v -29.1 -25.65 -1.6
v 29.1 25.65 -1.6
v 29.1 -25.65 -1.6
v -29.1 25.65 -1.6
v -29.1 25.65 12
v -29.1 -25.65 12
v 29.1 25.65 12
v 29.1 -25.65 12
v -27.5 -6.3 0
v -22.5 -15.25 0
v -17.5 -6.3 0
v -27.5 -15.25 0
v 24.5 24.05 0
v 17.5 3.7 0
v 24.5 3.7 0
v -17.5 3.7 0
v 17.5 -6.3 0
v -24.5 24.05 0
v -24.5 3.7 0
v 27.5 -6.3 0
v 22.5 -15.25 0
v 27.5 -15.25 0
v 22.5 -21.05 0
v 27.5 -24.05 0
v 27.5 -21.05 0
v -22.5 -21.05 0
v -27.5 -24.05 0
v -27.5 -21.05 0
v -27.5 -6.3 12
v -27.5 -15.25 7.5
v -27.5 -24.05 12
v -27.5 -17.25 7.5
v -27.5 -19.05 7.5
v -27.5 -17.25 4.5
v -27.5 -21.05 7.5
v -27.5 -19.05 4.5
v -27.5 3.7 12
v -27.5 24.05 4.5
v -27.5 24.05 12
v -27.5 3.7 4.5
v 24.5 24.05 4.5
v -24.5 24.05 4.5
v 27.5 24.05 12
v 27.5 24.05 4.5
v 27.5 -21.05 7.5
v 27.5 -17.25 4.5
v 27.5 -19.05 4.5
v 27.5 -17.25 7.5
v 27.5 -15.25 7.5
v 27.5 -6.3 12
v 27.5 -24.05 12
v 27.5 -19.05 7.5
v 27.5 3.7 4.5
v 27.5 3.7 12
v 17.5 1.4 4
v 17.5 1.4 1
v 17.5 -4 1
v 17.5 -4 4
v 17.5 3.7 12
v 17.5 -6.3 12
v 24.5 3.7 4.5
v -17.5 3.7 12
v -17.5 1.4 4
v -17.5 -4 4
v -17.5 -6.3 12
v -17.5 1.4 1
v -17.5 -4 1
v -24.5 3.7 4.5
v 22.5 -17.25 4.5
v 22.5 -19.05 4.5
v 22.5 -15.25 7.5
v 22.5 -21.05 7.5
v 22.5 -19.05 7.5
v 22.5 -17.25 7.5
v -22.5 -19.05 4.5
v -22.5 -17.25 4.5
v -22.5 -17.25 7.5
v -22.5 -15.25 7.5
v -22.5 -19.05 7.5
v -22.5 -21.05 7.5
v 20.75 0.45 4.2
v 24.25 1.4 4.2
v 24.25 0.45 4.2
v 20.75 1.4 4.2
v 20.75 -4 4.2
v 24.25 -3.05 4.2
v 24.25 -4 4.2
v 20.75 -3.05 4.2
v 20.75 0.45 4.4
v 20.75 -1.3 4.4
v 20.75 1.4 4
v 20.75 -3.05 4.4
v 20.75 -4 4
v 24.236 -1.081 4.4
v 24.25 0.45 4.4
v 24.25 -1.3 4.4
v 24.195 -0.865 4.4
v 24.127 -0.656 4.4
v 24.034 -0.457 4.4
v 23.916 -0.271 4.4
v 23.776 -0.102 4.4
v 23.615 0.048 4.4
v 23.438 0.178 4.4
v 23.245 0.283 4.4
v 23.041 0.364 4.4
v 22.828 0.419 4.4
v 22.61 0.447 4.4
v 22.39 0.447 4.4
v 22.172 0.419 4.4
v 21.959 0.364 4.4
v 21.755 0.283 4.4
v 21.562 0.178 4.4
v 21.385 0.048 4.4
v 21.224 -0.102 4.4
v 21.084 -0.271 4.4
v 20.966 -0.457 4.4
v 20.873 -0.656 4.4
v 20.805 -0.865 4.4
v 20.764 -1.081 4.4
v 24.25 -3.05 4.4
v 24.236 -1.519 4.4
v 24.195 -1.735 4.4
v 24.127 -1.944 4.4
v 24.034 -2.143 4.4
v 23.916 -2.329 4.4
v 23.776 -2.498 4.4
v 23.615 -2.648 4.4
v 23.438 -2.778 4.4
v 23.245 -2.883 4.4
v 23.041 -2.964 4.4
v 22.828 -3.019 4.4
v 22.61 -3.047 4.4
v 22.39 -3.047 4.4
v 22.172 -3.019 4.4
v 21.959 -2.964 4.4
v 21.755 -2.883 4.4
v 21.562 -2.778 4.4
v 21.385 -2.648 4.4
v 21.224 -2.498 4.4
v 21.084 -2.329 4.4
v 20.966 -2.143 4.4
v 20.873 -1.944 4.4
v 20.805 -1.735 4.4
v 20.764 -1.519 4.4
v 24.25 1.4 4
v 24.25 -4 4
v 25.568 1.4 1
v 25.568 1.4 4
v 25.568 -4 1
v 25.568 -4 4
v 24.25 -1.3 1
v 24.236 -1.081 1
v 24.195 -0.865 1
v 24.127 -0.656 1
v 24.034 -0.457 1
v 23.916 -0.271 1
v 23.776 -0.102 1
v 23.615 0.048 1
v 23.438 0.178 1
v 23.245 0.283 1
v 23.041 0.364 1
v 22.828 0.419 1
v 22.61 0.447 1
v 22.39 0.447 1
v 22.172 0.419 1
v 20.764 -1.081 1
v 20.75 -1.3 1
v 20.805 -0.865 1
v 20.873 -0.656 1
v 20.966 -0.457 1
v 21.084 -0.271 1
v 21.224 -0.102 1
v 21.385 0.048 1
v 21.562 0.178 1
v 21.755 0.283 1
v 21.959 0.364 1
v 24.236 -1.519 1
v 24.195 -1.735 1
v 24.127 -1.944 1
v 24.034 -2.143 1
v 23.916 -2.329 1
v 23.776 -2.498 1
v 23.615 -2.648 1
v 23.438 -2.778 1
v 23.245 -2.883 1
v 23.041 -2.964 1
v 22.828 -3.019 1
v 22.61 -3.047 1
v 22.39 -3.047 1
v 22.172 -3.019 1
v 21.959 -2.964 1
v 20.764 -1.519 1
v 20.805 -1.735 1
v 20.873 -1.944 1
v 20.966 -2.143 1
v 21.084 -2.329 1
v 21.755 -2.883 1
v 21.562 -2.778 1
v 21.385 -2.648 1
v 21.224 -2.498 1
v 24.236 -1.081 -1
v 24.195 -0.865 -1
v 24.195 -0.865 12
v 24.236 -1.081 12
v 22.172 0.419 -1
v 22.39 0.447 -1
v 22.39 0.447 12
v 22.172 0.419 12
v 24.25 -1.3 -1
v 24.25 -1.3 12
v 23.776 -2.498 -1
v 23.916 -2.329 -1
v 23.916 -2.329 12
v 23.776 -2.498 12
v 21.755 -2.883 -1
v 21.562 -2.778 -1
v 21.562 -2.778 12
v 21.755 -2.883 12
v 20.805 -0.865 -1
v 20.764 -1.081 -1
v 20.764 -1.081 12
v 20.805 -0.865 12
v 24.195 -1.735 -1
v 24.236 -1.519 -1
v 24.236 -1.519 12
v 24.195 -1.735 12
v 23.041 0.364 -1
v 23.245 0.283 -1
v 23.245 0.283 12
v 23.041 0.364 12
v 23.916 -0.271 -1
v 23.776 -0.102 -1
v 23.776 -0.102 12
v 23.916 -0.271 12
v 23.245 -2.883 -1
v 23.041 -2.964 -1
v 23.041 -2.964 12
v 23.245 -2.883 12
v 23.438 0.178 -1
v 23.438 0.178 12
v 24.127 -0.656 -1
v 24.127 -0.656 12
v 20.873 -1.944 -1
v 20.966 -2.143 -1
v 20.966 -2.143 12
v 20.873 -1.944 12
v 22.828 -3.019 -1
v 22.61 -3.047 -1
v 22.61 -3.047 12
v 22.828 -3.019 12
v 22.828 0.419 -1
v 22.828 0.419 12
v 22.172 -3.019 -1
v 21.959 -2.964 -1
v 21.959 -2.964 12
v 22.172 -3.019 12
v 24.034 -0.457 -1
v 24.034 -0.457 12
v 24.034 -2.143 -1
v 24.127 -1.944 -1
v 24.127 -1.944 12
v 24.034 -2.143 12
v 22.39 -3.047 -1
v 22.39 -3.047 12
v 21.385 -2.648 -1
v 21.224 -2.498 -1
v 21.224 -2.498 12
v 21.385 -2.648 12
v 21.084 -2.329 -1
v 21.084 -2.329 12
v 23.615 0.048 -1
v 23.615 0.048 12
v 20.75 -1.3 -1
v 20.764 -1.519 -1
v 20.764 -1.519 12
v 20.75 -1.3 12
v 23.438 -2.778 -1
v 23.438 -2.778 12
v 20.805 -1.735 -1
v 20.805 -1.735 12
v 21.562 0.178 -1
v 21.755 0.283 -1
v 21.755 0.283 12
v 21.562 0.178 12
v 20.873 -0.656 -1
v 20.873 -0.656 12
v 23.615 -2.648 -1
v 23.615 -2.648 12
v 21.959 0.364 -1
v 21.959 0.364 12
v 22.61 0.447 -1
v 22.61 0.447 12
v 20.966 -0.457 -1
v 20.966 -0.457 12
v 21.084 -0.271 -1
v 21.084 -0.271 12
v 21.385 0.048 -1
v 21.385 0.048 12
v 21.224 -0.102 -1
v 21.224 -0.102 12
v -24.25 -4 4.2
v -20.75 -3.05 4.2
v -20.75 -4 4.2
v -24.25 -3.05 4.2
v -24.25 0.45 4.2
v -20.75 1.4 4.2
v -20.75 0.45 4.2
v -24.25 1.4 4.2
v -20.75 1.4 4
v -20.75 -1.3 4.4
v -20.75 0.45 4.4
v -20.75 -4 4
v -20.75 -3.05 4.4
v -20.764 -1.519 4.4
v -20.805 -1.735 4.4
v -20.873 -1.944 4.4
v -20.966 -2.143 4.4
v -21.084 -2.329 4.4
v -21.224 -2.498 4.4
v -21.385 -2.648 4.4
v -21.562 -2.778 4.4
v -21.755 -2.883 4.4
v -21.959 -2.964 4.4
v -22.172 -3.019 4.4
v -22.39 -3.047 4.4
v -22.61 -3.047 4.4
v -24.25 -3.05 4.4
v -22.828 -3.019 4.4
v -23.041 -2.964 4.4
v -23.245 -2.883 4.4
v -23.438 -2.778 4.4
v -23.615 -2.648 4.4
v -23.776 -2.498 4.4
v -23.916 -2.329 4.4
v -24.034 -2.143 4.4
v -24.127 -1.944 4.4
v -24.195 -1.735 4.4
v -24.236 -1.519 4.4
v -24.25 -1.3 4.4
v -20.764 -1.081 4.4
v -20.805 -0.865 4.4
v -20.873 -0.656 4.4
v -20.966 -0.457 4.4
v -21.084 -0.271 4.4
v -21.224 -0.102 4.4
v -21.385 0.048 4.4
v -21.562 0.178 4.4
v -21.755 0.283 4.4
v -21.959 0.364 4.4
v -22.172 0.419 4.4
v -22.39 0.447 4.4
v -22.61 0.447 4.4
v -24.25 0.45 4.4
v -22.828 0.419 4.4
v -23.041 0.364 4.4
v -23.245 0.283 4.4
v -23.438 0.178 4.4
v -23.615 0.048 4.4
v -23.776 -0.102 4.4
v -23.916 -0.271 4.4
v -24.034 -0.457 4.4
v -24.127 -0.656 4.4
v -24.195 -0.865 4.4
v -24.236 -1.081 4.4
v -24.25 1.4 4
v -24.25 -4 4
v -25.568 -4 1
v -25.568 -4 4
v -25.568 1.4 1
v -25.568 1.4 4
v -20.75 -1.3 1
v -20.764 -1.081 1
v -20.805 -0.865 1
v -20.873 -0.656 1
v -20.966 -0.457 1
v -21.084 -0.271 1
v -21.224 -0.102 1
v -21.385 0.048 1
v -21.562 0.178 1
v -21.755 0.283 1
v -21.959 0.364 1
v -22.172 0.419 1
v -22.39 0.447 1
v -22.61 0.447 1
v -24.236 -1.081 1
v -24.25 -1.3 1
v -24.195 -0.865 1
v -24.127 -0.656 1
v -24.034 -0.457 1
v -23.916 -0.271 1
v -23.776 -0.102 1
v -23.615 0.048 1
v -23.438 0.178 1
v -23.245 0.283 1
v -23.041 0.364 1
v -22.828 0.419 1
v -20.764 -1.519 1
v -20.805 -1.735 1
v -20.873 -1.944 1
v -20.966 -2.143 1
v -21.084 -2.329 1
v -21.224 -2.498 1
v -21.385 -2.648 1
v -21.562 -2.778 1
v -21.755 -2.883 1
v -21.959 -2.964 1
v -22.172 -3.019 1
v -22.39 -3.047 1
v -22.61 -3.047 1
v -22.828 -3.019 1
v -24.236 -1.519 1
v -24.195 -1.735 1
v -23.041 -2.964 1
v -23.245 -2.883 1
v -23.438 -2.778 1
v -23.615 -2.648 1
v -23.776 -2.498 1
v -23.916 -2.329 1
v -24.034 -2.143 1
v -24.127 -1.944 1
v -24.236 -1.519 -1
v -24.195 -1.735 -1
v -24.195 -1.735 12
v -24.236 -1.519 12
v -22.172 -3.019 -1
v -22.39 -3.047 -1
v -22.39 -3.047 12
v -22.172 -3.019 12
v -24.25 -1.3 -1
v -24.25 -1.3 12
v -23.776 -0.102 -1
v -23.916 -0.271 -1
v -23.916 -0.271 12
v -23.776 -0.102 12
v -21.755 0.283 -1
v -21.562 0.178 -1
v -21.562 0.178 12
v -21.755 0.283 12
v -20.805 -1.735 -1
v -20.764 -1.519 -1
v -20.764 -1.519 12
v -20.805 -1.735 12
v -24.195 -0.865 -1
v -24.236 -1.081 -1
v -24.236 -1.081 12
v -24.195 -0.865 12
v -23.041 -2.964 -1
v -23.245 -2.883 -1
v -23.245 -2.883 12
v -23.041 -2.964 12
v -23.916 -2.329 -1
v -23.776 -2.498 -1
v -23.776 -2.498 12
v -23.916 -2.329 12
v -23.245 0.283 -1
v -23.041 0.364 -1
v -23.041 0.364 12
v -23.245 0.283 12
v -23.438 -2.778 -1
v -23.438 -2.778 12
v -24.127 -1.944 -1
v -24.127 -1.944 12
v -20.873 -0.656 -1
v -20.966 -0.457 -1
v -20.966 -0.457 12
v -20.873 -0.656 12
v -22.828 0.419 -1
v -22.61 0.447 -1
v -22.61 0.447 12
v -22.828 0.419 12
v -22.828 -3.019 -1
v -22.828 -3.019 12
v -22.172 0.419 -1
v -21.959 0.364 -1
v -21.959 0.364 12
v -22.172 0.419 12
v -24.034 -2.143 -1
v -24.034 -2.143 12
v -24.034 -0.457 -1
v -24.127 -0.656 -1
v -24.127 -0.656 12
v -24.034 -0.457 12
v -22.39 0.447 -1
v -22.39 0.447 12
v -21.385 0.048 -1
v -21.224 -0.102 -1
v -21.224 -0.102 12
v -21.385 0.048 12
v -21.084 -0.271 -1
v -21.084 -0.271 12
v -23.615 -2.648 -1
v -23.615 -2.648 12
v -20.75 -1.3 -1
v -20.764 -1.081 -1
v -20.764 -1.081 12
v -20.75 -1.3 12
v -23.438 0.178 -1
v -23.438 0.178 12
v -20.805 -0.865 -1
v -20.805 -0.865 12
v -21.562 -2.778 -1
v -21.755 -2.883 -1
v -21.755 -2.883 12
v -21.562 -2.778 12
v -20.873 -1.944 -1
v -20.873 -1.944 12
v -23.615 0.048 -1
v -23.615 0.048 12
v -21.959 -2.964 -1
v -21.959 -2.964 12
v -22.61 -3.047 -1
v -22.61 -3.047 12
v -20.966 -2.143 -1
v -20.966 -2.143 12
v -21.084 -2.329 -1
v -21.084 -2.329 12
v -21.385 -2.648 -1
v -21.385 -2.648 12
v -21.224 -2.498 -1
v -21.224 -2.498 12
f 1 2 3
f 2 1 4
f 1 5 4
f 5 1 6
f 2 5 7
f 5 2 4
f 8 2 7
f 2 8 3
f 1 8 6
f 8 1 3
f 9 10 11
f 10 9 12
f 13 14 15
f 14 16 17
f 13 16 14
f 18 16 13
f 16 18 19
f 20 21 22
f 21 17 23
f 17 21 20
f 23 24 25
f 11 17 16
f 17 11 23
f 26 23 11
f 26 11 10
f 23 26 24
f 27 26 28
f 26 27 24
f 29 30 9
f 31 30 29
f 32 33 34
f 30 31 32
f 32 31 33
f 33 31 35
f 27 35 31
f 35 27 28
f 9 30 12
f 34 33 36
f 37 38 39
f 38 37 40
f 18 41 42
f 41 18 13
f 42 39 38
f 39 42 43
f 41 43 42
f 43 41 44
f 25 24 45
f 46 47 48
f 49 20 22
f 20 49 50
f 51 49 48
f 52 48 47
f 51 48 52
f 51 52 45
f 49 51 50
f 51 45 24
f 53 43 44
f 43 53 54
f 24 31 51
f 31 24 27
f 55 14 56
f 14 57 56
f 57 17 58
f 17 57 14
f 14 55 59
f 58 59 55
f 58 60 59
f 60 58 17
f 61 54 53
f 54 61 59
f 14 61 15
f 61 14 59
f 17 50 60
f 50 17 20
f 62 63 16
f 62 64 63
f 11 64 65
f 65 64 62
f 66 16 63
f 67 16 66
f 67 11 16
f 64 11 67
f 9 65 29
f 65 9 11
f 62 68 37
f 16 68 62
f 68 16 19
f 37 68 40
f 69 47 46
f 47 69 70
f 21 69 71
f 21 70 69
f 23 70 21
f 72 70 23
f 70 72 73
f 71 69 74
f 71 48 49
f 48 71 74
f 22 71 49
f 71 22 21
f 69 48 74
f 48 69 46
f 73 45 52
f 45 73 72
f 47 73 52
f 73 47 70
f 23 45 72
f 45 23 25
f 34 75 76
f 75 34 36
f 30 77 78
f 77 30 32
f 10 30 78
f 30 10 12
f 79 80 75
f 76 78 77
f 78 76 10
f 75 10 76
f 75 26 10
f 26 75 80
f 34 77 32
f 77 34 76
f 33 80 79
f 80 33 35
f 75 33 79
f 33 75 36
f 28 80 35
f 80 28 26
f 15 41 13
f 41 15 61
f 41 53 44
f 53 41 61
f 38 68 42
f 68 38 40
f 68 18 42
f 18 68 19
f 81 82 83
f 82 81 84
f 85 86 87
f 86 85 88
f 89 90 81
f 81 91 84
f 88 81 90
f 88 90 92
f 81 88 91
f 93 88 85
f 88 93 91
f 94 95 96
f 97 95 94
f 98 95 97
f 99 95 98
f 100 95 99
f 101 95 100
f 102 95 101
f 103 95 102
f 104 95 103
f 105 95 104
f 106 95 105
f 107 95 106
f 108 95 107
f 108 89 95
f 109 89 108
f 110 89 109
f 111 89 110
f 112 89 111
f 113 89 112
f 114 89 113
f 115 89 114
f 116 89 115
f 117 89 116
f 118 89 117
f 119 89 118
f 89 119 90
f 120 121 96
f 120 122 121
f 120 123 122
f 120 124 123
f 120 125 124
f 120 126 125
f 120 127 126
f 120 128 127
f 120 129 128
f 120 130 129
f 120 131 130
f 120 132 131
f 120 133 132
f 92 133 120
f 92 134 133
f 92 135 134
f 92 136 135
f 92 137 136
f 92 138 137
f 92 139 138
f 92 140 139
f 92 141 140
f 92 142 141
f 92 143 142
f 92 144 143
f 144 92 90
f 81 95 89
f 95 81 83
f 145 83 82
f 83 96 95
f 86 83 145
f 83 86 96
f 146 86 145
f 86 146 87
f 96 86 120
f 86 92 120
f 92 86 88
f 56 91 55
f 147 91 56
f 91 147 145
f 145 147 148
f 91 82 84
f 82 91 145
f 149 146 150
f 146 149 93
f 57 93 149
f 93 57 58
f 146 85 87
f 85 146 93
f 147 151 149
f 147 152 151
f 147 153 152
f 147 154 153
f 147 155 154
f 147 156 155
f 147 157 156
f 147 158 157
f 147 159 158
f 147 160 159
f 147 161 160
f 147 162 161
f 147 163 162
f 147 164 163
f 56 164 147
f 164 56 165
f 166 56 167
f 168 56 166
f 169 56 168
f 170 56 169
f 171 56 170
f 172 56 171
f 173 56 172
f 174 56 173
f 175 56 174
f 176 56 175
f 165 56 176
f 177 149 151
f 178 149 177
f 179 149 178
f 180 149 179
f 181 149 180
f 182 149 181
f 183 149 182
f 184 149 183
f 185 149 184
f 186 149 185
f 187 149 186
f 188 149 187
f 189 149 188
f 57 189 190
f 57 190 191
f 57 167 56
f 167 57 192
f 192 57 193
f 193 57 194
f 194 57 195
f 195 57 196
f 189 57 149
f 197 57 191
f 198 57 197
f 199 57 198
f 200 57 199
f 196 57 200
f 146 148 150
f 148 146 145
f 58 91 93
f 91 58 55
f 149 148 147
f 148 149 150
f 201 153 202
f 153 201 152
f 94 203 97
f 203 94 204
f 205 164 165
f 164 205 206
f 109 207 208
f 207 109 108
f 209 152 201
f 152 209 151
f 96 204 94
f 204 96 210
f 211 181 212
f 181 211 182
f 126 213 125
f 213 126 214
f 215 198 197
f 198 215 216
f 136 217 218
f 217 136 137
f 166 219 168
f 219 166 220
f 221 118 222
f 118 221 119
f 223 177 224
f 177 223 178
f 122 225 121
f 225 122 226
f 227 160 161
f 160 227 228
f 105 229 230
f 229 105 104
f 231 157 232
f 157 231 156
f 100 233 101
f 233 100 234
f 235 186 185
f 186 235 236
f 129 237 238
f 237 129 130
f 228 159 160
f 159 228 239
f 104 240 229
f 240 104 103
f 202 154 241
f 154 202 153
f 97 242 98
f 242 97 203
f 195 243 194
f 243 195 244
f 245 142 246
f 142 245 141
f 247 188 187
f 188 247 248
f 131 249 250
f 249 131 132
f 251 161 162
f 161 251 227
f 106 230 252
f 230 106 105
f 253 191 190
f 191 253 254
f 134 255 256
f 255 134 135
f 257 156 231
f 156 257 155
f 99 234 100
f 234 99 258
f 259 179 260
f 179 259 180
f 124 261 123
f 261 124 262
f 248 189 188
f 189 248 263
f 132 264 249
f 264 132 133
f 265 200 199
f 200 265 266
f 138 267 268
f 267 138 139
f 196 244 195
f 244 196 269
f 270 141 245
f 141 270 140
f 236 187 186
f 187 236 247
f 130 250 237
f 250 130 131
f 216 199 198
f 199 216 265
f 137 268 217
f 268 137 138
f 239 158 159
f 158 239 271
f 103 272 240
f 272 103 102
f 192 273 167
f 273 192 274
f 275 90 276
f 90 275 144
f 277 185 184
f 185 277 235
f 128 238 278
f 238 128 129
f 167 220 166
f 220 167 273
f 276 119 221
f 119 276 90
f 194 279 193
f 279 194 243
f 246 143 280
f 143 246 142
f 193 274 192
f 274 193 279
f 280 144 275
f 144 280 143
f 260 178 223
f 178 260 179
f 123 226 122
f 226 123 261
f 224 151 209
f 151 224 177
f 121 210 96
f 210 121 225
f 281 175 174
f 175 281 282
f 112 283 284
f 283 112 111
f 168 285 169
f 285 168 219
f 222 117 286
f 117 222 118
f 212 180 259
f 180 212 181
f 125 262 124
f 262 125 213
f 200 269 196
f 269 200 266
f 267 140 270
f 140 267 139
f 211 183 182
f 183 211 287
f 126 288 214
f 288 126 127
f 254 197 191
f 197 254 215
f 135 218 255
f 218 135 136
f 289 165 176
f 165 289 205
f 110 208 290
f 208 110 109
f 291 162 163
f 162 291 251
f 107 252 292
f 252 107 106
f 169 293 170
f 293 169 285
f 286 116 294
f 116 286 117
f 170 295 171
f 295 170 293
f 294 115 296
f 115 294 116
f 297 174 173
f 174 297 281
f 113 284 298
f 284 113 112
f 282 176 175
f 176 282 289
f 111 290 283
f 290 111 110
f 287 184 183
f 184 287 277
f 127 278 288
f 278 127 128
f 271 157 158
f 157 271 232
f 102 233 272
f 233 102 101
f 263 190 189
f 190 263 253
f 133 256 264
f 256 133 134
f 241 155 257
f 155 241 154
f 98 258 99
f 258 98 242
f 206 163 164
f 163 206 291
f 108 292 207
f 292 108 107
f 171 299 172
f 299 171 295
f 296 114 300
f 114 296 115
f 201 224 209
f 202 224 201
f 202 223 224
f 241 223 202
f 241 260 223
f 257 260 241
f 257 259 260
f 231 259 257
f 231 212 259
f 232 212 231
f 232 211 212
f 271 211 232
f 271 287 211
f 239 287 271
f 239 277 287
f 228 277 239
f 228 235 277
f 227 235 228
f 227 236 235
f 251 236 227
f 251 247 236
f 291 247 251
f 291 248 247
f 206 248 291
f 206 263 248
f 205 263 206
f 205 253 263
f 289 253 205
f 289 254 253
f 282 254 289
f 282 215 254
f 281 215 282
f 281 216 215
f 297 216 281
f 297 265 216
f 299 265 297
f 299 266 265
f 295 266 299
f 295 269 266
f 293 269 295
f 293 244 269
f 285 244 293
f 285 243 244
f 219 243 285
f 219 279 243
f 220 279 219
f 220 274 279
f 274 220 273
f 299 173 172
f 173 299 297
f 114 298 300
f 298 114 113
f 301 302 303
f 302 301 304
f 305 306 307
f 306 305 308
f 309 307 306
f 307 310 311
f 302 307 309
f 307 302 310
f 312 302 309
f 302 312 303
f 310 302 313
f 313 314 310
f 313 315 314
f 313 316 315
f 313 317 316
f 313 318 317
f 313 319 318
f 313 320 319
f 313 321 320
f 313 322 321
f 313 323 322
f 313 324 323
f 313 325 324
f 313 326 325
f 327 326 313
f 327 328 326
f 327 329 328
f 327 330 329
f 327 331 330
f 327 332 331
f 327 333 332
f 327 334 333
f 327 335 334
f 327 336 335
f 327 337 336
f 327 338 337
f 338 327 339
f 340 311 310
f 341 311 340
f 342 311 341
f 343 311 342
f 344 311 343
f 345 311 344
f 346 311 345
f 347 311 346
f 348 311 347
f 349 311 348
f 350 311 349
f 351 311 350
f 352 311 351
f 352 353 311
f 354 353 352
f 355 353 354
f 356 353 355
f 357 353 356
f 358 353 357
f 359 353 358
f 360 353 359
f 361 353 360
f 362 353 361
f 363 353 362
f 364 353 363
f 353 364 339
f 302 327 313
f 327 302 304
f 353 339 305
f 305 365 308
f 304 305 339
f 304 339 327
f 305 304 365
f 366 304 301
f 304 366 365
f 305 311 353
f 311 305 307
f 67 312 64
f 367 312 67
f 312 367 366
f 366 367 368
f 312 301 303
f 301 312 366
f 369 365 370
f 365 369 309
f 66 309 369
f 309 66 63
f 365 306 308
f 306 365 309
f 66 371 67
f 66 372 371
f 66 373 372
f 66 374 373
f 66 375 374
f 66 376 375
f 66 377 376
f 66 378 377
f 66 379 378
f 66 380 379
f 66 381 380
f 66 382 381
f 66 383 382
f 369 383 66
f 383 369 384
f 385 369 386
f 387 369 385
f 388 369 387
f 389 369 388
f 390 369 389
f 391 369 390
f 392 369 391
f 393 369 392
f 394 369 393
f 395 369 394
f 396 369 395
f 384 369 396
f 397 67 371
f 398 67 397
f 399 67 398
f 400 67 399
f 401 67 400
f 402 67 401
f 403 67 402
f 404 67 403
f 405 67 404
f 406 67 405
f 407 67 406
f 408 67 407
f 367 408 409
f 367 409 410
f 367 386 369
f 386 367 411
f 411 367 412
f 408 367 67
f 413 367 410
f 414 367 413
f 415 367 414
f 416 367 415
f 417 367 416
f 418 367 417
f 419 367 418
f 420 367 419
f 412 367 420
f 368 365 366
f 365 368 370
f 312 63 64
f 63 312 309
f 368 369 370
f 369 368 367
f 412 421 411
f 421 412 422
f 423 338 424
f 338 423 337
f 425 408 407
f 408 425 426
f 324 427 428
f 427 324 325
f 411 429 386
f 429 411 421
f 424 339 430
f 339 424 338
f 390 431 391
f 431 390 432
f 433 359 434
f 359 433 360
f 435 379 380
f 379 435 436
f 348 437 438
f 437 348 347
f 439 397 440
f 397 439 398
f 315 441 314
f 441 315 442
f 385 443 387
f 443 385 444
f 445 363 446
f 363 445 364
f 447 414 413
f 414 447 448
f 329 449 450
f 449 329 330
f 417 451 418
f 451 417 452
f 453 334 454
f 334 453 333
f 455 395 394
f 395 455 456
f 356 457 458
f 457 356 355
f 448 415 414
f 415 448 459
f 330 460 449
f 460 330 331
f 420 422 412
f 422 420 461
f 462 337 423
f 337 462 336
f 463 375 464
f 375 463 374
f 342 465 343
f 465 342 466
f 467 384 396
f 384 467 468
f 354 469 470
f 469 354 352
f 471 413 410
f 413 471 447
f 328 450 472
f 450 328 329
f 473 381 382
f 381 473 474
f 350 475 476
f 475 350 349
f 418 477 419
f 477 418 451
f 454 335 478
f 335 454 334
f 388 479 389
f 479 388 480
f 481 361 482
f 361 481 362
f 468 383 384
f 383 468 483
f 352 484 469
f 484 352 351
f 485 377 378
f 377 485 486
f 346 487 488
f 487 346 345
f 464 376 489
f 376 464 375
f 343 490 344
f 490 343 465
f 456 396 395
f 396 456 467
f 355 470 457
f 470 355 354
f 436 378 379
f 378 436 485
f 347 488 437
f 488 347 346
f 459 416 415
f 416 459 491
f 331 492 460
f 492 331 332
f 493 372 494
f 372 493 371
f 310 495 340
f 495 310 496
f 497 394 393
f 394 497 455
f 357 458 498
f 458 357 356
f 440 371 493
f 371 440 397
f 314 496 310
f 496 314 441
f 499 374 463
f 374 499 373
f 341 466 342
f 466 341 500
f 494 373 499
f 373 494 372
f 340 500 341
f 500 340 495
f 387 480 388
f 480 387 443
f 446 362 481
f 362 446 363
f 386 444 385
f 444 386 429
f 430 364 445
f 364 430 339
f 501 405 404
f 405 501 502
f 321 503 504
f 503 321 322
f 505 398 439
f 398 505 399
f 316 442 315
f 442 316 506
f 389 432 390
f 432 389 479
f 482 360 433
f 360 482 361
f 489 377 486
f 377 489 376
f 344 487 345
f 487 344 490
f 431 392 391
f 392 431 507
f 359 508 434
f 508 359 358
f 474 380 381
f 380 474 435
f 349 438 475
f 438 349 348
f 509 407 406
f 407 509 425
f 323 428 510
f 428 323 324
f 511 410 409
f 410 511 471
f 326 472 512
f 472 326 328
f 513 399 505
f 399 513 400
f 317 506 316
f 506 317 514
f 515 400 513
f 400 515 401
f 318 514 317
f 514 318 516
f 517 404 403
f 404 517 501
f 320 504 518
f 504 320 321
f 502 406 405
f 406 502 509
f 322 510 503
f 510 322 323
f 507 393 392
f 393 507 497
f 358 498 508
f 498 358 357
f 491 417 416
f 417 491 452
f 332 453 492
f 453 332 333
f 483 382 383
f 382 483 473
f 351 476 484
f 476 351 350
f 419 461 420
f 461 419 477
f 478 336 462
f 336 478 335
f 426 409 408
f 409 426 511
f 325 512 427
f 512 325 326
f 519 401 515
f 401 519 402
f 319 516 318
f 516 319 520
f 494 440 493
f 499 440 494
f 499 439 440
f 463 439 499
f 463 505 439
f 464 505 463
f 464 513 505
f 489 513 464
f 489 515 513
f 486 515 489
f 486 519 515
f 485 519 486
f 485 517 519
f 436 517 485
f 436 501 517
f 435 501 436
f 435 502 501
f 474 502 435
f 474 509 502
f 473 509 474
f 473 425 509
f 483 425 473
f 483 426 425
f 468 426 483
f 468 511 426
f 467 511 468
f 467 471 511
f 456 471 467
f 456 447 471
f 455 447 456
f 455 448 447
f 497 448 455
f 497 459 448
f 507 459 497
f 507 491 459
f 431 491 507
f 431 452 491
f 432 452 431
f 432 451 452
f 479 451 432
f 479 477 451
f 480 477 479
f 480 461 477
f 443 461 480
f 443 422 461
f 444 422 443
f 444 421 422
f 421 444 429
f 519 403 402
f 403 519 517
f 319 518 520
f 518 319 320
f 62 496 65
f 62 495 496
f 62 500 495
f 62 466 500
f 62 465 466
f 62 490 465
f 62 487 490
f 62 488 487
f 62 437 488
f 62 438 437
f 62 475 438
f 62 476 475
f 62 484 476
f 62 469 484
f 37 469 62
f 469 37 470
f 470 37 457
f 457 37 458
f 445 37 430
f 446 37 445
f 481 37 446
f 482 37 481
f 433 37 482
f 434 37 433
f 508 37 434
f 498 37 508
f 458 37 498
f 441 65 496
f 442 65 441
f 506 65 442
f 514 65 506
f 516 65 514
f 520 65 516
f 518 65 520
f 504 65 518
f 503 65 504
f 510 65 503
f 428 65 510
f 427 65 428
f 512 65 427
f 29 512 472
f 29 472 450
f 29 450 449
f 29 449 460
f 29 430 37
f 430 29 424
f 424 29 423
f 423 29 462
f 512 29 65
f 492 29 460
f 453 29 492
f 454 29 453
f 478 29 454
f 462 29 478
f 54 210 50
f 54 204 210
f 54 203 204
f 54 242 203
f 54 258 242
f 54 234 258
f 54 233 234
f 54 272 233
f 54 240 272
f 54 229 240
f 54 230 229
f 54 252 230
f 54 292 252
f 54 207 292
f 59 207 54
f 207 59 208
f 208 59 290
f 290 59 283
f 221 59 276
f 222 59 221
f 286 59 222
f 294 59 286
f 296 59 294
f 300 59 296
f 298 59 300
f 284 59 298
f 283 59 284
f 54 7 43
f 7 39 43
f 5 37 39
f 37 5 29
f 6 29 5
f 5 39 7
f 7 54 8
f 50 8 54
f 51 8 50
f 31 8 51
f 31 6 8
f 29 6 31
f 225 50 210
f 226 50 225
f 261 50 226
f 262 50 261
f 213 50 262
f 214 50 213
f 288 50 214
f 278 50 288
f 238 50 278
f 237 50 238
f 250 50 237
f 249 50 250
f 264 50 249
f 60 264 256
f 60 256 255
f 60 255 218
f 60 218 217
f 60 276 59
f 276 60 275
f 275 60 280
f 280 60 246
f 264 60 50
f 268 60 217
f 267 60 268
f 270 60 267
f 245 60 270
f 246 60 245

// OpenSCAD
LAYER_HEIGHT = 0.2;
PCB_X = 55;
PCB_Y = 1.8;
PARTS_Y = 5;
PCB_Z = 26;
WALL_THICKNESS = 1.6;

PCB_BUFFER_Z = 4.5;

GAP = 20; // Gap between PCB and sensor

SEN66_X = 55; // Hopefully
SEN66_Y = 21.3; // Hopefully
SEN66_Z = 26; // Hopefully
SEN66_BUFFER_Z = PCB_BUFFER_Z;

BOLT_DIAMETER = 3.5;
BOLT_HEAD_DIAMETER = 6;
BOLT_HEAD_HEIGHT = 3;
NUT_FLAT_TO_FLAT = 5.4;
NUT_LENGTH = 3;
FROM_BOLT_BOTTOM = 1;
POST_SIZE = 10;

inner_y = PCB_Y + PARTS_Y + SEN66_Y + GAP;
inner_z = PCB_Z + (PCB_BUFFER_Z * 2);

module BoltNegative(post_size, nominal_length, head_length) {
    flat_to_flat = NUT_FLAT_TO_FLAT;
    bolt_diameter = BOLT_DIAMETER;
    head_diameter = BOLT_HEAD_DIAMETER;
    from_bolt_bottom = FROM_BOLT_BOTTOM;
    nut_length = NUT_LENGTH;

    corner_to_corner = flat_to_flat * 1.1547;

    union() {
        // Bridges for nut slot
        translate([0, 0, from_bolt_bottom + nut_length + LAYER_HEIGHT])
            linear_extrude(LAYER_HEIGHT)
            square(size = [bolt_diameter, bolt_diameter], center = true);

        // Bridges for nut slot
        translate([0, 0, from_bolt_bottom + nut_length - 0.1])
            linear_extrude(LAYER_HEIGHT + 0.1)
            square(size = [bolt_diameter, flat_to_flat], center = true);

        // Slot for nut
        color("pink")
            translate([-((((post_size - corner_to_corner) / 2) / 2) + 0.1), 0, from_bolt_bottom])
            linear_extrude(nut_length)
            square(size = [corner_to_corner + ((post_size - corner_to_corner) / 2) + 0.1, flat_to_flat], center = true);

        // Bolt head sink
        color("blue")
            translate([0, 0, nominal_length])
            linear_extrude(head_length + 1)
            circle(d = head_diameter, $fn = 50);

        // Bolt shaft
        color("green")
            translate([0, 0, -1])
            linear_extrude(nominal_length + 2)
            circle(d = bolt_diameter, $fn = 50);
    }
}

module BoltPositive(post_size, nominal_length, head_length) {
    difference() {
        linear_extrude(nominal_length + head_length)
            square(size = post_size, center = true);
    }
}

module BoltPostsPositive(width, height) {
    post_size = POST_SIZE;
    post_height = height;

    move = (width / 2) - (post_size / 2);

    translate([move, 0, 0])
        BoltPositive(post_size, post_height - BOLT_HEAD_HEIGHT, BOLT_HEAD_HEIGHT);

    translate([-move, 0, 0])
        rotate(180)
        BoltPositive(post_size, post_height - BOLT_HEAD_HEIGHT, BOLT_HEAD_HEIGHT);
}

module BoltPostsNegative(width, height) {
    post_size = 10;
    post_height = height;

    move = (width / 2) - (post_size / 2);

    translate([move, 0, 0])
        BoltNegative(post_size, post_height - BOLT_HEAD_HEIGHT, BOLT_HEAD_HEIGHT);

    translate([-move, 0, 0])
        rotate(180)
        BoltNegative(post_size, post_height - BOLT_HEAD_HEIGHT, BOLT_HEAD_HEIGHT);
}

module Main() {
    inner_x = max(PCB_X, SEN66_X);

    difference() {
        // Exterior
        translate([0, 0, -WALL_THICKNESS])
            linear_extrude(inner_z + (WALL_THICKNESS * 2))
            square(size = [inner_x + (WALL_THICKNESS * 2), inner_y + (WALL_THICKNESS * 2)], center = true);

        // Interior
        linear_extrude(inner_z)
            square(size = [inner_x, inner_y], center = true);
    }
}

module BottomPCBTabs(tab_x, tab_y, tab_z) {
    for (i = [1, -1]) {
        translate([i * ((PCB_X / 2) - (tab_x / 2)), 0, -PCB_BUFFER_Z])
            linear_extrude(PCB_BUFFER_Z)
            square(size = [tab_x, tab_y * 2 + PCB_Y], center = true);
        for (j = [1, -1]) {
            translate([i * ((PCB_X / 2) - (tab_x / 2)), j * (((tab_y / 2) + (PCB_Y / 2))), 0])
                linear_extrude(tab_z)
                square(size = [tab_x, tab_y], center = true);
        }
    }
}

module PCBTabs() {
    tab_z = 3;
    tab_y = 2;
    tab_x = 5;

    translate([0, 0, (PCB_Z / 2) + PCB_BUFFER_Z]) {
        rotate([180, 0, 0])
            translate([0, 0, -PCB_Z / 2])
            BottomPCBTabs(tab_x, tab_y, tab_z);
        translate([0, 0, -PCB_Z / 2])
            BottomPCBTabs(tab_x, tab_y, tab_z);
    }
}

module FullBox() {
    difference() {
        union() {
            Main();
            translate([0, (-POST_SIZE / 2) + (inner_z - POST_SIZE - SEN66_Y), 0])
                BoltPostsPositive(55, inner_z + WALL_THICKNESS);

            translate([0, (-(inner_y / 2)) + (PCB_Y / 2) + PARTS_Y, 0])
                PCBTabs();
            translate([0, (inner_y / 2) - SEN66_Y, 0])
                SEN66Tabs();
        }

        translate([0, (-POST_SIZE / 2) + (inner_z - POST_SIZE - SEN66_Y), 0])
            BoltPostsNegative(55, inner_z + WALL_THICKNESS);
    }
}

module BottomSlice() {
    difference() {
        FullBox();
        translate([0, 0, 12])
            linear_extrude(60)
            square(size = 60, center = true);
    }
}

module SEN66Tabs() {
    tab_x = 10;
    tab_y = 2;
    tab_z = 6;

    rail_x = 3;

    translate([0, 0, (SEN66_Z + SEN66_BUFFER_Z) / 2])
        for(j = [0, 180]) {
            rotate([0, j, 0])
                translate([0, 0, -(SEN66_Z + SEN66_BUFFER_Z) / 2])
                for(i = [0, 1]) {
                    mirror([i, 0, 0])
                        translate([SEN66_X / 2, 0, 0]) {
                            translate([-(rail_x / 2), SEN66_Y / 2, 0])
                                linear_extrude(SEN66_BUFFER_Z)
                                square(size = [rail_x, SEN66_Y], center = true);
                        }
                }
        }
}

BottomSlice();

//PCBTabs();
